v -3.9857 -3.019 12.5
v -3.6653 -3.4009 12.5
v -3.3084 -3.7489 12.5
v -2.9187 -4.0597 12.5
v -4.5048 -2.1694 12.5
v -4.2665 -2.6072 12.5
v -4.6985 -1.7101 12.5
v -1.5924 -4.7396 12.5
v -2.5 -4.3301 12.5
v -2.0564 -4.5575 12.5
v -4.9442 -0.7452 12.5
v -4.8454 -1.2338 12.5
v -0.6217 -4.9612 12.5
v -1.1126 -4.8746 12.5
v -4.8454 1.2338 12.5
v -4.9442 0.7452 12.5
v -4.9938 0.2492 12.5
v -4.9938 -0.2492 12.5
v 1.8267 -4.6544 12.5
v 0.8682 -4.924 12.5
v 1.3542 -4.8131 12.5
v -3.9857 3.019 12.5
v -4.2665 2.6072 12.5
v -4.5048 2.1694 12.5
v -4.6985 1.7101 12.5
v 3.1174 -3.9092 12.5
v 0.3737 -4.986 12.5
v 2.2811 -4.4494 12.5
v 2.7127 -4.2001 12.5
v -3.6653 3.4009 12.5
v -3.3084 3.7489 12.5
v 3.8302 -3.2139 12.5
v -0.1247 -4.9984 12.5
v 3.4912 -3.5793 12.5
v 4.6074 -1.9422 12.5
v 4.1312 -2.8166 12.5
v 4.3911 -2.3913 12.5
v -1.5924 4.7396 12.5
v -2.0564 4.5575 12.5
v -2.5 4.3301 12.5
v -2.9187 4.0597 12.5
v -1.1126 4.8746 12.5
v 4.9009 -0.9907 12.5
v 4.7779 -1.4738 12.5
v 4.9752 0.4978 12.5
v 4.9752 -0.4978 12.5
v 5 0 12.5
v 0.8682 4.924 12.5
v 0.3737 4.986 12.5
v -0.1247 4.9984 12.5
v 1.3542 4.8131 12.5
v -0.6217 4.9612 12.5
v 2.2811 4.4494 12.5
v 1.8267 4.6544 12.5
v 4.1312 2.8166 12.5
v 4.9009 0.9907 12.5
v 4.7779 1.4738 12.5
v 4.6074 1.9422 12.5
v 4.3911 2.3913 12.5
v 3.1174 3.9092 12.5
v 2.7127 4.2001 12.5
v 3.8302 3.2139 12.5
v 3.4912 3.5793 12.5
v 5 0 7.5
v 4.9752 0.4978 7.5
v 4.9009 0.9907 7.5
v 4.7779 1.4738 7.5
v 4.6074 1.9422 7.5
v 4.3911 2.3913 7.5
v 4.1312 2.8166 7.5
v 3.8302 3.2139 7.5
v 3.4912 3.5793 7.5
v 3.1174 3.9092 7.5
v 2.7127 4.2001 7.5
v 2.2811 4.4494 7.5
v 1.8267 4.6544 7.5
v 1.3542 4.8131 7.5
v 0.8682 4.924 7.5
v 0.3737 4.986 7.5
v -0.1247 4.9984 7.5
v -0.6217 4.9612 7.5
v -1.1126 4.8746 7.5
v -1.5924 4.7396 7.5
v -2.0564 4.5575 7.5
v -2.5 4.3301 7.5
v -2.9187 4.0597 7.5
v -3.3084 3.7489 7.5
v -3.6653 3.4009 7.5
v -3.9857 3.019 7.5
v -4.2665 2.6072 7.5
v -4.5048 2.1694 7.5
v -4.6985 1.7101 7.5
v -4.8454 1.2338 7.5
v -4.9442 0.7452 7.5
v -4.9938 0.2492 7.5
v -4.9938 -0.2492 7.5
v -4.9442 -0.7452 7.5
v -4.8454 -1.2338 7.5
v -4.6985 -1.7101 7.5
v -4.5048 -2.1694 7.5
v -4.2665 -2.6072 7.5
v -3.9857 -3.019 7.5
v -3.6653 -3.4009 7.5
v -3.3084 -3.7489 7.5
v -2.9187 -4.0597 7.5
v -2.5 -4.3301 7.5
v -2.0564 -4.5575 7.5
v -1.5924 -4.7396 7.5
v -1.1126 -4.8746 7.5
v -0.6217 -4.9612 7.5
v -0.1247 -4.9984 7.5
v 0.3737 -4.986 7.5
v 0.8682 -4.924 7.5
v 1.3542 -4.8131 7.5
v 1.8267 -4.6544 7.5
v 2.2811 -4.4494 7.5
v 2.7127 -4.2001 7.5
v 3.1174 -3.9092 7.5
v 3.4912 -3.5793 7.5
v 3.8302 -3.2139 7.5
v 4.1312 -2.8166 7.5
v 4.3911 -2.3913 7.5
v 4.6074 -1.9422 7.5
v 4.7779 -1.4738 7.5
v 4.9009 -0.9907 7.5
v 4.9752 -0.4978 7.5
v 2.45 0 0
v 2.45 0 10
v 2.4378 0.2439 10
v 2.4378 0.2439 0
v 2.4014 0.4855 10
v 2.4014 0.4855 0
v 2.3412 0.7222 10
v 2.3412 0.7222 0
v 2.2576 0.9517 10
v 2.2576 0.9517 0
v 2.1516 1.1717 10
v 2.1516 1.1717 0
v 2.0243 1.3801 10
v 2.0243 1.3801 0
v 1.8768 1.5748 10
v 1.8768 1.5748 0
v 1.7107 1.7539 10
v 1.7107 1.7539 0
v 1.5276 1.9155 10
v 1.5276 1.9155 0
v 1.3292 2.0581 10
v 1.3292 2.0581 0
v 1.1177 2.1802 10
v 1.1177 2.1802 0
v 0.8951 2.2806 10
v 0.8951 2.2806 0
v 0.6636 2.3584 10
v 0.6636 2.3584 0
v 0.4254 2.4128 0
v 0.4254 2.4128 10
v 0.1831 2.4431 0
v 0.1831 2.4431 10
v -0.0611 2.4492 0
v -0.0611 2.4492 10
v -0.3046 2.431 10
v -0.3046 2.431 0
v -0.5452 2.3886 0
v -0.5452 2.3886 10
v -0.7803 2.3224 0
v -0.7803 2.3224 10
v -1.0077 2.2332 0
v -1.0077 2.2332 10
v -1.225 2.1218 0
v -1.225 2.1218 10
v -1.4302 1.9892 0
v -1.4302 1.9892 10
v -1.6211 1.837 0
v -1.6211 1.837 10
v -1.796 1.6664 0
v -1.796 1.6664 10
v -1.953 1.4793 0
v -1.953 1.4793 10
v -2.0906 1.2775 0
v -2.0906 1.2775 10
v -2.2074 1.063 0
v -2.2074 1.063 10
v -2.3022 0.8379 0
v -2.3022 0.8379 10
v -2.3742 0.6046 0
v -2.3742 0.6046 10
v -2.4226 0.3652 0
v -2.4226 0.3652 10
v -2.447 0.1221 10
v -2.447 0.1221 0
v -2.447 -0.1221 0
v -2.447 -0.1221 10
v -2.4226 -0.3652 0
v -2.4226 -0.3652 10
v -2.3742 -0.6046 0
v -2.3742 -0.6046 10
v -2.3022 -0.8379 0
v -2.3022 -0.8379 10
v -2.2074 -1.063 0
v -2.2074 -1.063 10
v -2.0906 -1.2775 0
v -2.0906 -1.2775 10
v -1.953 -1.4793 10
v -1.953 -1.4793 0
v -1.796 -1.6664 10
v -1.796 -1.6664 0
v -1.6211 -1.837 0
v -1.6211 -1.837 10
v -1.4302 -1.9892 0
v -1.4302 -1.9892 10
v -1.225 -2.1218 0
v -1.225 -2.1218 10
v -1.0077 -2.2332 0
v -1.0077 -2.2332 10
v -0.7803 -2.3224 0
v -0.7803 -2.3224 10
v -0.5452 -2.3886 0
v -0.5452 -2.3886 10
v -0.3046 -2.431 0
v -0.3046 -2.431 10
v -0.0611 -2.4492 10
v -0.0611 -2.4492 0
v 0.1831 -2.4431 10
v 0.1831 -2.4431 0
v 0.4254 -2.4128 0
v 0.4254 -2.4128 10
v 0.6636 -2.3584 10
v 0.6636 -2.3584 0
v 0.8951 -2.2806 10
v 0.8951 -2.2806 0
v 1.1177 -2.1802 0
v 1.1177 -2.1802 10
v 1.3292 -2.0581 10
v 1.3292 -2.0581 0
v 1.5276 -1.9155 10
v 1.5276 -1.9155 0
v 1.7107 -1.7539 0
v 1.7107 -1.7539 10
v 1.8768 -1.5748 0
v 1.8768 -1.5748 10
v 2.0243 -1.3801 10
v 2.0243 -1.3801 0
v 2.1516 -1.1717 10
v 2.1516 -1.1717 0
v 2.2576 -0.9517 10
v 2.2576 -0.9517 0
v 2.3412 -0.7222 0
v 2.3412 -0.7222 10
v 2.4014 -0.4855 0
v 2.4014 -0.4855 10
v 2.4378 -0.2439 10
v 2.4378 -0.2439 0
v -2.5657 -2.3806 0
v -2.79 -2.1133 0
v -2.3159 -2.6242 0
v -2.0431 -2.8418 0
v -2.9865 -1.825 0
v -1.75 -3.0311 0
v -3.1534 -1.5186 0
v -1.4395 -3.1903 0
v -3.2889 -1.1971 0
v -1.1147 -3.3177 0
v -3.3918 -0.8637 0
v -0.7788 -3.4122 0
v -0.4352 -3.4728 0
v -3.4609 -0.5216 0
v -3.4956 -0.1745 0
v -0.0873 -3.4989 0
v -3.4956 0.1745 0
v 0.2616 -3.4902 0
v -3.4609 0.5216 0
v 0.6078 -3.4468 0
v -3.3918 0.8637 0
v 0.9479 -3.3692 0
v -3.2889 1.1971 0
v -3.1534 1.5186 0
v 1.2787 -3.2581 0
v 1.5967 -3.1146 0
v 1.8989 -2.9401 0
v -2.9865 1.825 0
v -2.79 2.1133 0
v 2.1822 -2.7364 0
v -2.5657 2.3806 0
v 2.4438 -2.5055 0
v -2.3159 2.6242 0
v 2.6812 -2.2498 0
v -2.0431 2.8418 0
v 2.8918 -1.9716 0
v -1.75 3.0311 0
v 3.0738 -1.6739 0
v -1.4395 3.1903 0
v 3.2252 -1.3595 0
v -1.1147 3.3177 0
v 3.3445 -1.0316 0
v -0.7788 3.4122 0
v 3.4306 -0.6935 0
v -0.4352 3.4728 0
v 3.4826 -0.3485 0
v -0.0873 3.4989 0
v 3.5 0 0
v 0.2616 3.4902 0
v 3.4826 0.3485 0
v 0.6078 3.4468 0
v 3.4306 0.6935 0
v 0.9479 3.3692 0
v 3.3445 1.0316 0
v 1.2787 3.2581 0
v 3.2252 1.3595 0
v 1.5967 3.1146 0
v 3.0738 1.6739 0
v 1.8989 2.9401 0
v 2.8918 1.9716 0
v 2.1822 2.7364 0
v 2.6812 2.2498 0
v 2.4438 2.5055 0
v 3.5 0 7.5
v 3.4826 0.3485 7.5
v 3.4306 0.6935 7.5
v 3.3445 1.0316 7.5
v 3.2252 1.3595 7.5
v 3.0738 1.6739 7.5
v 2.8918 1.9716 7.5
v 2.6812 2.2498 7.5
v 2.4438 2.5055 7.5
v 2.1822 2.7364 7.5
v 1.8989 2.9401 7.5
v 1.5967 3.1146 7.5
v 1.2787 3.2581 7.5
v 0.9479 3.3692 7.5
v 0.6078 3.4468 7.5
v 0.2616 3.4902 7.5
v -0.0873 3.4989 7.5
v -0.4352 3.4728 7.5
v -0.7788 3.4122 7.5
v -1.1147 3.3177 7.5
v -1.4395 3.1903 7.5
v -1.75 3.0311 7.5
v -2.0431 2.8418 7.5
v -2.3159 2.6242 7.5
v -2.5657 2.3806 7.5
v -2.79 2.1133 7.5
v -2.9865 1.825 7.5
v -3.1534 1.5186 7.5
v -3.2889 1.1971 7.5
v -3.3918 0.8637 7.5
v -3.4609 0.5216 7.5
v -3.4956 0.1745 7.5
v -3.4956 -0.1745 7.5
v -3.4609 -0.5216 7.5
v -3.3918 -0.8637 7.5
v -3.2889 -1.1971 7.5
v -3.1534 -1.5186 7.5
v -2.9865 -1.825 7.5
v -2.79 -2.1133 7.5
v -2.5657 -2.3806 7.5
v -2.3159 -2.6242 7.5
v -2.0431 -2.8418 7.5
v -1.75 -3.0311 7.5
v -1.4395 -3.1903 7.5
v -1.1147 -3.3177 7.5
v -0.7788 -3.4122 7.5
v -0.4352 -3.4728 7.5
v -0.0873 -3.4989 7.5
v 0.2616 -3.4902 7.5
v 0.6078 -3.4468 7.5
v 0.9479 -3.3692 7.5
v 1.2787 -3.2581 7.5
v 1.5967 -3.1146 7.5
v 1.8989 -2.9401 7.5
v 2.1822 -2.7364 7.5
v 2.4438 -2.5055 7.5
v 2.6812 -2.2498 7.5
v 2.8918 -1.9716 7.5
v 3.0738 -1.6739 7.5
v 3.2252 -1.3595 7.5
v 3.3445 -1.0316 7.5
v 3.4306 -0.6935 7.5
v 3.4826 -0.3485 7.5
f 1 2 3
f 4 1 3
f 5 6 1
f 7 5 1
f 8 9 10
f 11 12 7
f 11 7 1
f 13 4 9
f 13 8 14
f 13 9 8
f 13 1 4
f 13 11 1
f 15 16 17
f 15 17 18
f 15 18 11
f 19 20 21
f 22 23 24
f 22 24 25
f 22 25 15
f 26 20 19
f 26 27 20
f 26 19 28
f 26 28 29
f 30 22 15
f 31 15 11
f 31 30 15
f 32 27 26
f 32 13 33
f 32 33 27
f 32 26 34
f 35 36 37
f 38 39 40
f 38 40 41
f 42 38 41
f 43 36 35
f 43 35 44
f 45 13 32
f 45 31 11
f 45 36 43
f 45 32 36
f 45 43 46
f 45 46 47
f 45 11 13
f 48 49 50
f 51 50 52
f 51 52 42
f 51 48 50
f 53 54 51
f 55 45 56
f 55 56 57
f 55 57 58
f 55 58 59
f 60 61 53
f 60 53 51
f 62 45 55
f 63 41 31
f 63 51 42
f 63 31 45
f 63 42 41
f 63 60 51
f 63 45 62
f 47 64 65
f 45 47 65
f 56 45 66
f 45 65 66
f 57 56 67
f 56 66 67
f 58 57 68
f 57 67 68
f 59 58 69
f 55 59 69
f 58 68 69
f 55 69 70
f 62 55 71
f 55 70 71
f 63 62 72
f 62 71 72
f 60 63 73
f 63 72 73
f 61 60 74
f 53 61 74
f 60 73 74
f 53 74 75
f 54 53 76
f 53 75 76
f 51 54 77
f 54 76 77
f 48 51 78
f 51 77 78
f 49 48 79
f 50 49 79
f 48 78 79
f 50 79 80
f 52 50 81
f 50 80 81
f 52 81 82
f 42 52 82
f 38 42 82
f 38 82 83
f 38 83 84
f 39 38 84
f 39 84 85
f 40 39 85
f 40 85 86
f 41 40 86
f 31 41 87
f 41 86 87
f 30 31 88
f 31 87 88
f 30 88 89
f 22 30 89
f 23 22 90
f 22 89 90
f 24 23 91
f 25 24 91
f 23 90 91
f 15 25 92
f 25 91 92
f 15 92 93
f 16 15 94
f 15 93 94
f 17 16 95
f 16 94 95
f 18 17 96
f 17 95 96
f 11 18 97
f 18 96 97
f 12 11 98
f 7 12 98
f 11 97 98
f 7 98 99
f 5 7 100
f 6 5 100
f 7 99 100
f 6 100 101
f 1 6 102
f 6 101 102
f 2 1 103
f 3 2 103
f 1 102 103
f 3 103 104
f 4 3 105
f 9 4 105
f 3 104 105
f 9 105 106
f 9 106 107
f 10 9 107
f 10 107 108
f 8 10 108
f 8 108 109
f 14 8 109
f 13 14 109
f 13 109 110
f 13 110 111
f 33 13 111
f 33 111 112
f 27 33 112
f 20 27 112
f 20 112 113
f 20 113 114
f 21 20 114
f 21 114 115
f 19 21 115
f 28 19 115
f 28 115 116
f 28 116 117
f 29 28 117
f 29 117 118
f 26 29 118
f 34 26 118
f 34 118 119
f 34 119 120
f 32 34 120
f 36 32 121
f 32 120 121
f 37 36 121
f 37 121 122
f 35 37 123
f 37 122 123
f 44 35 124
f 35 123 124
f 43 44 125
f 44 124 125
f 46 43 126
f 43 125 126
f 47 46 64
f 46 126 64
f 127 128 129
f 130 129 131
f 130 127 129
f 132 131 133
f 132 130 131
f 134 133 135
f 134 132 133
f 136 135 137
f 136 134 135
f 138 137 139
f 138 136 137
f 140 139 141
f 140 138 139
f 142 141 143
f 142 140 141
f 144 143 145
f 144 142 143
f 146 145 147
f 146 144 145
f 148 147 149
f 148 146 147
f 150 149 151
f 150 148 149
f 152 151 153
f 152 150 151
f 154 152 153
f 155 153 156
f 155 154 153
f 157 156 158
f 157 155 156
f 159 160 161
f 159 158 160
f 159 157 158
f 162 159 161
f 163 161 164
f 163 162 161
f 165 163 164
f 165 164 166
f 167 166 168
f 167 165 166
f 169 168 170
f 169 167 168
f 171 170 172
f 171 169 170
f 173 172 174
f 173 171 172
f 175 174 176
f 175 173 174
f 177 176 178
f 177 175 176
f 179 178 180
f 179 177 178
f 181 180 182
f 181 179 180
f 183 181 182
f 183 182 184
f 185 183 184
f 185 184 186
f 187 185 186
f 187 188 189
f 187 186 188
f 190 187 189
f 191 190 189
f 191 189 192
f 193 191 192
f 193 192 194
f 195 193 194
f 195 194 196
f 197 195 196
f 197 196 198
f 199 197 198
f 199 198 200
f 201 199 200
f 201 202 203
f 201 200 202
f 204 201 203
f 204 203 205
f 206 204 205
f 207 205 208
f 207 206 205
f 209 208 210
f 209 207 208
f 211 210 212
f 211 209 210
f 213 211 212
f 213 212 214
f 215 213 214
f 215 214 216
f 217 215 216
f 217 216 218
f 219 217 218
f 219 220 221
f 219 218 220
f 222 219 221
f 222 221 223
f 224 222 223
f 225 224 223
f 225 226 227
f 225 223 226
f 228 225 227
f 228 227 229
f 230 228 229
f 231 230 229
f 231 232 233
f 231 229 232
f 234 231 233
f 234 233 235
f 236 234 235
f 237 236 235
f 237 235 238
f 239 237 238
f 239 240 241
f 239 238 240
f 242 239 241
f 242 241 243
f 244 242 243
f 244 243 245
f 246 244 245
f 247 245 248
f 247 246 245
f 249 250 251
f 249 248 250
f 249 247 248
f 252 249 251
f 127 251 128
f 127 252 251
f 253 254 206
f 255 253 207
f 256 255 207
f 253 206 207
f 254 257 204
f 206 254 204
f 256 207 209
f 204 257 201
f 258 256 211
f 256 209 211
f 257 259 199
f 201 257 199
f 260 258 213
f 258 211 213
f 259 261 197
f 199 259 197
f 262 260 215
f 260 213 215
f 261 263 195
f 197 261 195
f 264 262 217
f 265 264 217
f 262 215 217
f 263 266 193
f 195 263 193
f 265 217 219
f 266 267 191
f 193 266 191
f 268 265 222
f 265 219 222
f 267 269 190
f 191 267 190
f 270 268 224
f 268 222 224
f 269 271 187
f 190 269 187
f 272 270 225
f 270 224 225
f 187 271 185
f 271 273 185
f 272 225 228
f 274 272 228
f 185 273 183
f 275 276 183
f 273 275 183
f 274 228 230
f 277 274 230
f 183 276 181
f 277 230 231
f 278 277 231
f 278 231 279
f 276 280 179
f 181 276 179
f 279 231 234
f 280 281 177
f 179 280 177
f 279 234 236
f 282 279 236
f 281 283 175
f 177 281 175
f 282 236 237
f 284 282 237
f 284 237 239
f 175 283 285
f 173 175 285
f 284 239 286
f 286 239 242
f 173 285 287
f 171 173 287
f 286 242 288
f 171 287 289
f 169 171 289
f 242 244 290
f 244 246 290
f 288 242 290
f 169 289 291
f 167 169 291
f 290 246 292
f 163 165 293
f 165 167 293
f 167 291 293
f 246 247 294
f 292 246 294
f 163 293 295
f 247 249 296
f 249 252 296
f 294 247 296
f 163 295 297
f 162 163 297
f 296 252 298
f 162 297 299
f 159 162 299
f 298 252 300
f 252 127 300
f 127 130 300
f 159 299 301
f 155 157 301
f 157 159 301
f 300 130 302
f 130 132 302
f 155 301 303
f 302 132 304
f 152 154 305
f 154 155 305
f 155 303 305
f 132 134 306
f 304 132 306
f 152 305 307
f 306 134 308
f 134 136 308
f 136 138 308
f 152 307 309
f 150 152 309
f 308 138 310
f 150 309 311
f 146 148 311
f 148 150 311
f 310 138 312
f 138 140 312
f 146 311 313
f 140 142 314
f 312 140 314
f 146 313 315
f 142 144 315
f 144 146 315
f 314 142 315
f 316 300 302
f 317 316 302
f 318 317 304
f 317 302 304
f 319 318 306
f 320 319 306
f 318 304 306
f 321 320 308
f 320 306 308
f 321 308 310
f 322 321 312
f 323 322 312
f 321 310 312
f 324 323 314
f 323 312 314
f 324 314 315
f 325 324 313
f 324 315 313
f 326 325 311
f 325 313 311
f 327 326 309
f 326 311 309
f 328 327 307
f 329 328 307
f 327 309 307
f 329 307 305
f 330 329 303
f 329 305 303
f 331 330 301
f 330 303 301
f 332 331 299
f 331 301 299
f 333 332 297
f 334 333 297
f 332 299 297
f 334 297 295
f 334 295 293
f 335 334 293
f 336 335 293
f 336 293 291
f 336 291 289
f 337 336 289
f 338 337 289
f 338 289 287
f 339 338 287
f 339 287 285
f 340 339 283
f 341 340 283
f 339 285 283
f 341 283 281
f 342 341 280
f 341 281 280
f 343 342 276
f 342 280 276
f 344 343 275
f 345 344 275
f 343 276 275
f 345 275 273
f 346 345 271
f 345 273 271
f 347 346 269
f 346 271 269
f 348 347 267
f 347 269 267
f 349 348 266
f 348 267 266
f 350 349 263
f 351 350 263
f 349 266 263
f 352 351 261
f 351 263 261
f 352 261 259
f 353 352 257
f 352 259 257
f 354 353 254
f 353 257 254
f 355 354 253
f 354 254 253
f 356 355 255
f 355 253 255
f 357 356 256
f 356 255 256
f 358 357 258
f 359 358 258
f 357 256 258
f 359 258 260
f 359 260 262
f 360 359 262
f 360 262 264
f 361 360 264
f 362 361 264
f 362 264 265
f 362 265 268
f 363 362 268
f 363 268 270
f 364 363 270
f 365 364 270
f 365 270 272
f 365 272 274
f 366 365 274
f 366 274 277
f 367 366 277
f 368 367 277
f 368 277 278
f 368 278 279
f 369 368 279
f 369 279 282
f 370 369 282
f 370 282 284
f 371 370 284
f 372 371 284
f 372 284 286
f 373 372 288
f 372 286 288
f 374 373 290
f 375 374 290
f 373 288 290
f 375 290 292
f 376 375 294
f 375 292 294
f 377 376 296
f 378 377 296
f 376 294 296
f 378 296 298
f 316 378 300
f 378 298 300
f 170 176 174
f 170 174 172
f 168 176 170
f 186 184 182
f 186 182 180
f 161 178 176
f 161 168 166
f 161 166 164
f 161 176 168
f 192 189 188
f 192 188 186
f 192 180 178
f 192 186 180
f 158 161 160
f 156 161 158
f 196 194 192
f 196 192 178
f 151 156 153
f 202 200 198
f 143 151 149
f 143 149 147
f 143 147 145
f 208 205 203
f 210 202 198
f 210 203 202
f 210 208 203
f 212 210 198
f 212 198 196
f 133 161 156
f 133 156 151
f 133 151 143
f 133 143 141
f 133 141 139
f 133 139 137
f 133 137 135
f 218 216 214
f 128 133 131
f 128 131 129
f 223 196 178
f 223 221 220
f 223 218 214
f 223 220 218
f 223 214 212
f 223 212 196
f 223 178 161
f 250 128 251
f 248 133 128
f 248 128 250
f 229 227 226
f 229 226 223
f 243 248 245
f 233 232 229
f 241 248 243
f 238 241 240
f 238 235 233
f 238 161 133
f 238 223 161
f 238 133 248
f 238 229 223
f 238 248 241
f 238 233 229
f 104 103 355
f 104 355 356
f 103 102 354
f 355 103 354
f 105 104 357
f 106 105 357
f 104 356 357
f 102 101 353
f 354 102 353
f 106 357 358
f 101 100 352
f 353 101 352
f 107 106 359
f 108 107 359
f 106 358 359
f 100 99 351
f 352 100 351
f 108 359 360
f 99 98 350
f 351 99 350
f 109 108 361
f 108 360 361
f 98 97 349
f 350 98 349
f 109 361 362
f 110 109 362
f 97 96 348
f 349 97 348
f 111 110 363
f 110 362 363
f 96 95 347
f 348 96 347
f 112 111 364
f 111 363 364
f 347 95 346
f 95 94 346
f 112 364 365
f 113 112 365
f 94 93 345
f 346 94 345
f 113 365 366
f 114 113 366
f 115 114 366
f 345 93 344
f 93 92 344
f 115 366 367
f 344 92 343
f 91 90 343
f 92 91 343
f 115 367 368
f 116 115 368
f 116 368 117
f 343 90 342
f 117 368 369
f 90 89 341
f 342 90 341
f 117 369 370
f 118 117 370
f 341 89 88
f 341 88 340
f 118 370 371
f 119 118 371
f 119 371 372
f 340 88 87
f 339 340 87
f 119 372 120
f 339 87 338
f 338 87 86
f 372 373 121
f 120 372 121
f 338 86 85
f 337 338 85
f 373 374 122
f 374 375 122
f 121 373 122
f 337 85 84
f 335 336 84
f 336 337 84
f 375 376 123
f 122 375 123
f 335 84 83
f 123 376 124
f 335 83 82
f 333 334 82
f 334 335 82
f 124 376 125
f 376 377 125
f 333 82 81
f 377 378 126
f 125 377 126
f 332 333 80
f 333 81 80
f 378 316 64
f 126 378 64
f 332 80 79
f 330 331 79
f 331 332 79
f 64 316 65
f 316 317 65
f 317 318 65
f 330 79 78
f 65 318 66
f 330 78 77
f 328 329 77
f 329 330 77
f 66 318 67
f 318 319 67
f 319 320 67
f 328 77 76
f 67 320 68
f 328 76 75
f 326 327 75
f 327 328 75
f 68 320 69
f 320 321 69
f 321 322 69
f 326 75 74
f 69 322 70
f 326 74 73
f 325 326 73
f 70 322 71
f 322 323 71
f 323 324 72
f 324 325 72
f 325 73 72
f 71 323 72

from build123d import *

# Parameters (mm, degrees)
F0_R     = 3.5
F0_R_2   = 2.45
F1_DEPTH = 7.5
F2_R     = 5
F3_DEPTH = 5
F4_R     = 2.45
F5_DEPTH = 2.5


with BuildPart() as f1:
    # F0 (on Top) → F1 (new body)
    with BuildSketch(Plane.XY):
        Circle(F0_R)
        Circle(F0_R_2, mode=Mode.SUBTRACT)
    extrude(amount=F1_DEPTH)

    # F2 (on face) → F3 (join)
    with BuildSketch(Plane.XY.offset(7.5)):
        Circle(F2_R)
    extrude(amount=F3_DEPTH)

    # F4 (on face) → F5 (cut)
    with BuildSketch(Plane(origin=(0, 0, 7.5), x_dir=(1, 0, 0), z_dir=(0, 0, -1))):
        Circle(F4_R)
    extrude(amount=-F5_DEPTH, mode=Mode.SUBTRACT)


solid = f1.part
